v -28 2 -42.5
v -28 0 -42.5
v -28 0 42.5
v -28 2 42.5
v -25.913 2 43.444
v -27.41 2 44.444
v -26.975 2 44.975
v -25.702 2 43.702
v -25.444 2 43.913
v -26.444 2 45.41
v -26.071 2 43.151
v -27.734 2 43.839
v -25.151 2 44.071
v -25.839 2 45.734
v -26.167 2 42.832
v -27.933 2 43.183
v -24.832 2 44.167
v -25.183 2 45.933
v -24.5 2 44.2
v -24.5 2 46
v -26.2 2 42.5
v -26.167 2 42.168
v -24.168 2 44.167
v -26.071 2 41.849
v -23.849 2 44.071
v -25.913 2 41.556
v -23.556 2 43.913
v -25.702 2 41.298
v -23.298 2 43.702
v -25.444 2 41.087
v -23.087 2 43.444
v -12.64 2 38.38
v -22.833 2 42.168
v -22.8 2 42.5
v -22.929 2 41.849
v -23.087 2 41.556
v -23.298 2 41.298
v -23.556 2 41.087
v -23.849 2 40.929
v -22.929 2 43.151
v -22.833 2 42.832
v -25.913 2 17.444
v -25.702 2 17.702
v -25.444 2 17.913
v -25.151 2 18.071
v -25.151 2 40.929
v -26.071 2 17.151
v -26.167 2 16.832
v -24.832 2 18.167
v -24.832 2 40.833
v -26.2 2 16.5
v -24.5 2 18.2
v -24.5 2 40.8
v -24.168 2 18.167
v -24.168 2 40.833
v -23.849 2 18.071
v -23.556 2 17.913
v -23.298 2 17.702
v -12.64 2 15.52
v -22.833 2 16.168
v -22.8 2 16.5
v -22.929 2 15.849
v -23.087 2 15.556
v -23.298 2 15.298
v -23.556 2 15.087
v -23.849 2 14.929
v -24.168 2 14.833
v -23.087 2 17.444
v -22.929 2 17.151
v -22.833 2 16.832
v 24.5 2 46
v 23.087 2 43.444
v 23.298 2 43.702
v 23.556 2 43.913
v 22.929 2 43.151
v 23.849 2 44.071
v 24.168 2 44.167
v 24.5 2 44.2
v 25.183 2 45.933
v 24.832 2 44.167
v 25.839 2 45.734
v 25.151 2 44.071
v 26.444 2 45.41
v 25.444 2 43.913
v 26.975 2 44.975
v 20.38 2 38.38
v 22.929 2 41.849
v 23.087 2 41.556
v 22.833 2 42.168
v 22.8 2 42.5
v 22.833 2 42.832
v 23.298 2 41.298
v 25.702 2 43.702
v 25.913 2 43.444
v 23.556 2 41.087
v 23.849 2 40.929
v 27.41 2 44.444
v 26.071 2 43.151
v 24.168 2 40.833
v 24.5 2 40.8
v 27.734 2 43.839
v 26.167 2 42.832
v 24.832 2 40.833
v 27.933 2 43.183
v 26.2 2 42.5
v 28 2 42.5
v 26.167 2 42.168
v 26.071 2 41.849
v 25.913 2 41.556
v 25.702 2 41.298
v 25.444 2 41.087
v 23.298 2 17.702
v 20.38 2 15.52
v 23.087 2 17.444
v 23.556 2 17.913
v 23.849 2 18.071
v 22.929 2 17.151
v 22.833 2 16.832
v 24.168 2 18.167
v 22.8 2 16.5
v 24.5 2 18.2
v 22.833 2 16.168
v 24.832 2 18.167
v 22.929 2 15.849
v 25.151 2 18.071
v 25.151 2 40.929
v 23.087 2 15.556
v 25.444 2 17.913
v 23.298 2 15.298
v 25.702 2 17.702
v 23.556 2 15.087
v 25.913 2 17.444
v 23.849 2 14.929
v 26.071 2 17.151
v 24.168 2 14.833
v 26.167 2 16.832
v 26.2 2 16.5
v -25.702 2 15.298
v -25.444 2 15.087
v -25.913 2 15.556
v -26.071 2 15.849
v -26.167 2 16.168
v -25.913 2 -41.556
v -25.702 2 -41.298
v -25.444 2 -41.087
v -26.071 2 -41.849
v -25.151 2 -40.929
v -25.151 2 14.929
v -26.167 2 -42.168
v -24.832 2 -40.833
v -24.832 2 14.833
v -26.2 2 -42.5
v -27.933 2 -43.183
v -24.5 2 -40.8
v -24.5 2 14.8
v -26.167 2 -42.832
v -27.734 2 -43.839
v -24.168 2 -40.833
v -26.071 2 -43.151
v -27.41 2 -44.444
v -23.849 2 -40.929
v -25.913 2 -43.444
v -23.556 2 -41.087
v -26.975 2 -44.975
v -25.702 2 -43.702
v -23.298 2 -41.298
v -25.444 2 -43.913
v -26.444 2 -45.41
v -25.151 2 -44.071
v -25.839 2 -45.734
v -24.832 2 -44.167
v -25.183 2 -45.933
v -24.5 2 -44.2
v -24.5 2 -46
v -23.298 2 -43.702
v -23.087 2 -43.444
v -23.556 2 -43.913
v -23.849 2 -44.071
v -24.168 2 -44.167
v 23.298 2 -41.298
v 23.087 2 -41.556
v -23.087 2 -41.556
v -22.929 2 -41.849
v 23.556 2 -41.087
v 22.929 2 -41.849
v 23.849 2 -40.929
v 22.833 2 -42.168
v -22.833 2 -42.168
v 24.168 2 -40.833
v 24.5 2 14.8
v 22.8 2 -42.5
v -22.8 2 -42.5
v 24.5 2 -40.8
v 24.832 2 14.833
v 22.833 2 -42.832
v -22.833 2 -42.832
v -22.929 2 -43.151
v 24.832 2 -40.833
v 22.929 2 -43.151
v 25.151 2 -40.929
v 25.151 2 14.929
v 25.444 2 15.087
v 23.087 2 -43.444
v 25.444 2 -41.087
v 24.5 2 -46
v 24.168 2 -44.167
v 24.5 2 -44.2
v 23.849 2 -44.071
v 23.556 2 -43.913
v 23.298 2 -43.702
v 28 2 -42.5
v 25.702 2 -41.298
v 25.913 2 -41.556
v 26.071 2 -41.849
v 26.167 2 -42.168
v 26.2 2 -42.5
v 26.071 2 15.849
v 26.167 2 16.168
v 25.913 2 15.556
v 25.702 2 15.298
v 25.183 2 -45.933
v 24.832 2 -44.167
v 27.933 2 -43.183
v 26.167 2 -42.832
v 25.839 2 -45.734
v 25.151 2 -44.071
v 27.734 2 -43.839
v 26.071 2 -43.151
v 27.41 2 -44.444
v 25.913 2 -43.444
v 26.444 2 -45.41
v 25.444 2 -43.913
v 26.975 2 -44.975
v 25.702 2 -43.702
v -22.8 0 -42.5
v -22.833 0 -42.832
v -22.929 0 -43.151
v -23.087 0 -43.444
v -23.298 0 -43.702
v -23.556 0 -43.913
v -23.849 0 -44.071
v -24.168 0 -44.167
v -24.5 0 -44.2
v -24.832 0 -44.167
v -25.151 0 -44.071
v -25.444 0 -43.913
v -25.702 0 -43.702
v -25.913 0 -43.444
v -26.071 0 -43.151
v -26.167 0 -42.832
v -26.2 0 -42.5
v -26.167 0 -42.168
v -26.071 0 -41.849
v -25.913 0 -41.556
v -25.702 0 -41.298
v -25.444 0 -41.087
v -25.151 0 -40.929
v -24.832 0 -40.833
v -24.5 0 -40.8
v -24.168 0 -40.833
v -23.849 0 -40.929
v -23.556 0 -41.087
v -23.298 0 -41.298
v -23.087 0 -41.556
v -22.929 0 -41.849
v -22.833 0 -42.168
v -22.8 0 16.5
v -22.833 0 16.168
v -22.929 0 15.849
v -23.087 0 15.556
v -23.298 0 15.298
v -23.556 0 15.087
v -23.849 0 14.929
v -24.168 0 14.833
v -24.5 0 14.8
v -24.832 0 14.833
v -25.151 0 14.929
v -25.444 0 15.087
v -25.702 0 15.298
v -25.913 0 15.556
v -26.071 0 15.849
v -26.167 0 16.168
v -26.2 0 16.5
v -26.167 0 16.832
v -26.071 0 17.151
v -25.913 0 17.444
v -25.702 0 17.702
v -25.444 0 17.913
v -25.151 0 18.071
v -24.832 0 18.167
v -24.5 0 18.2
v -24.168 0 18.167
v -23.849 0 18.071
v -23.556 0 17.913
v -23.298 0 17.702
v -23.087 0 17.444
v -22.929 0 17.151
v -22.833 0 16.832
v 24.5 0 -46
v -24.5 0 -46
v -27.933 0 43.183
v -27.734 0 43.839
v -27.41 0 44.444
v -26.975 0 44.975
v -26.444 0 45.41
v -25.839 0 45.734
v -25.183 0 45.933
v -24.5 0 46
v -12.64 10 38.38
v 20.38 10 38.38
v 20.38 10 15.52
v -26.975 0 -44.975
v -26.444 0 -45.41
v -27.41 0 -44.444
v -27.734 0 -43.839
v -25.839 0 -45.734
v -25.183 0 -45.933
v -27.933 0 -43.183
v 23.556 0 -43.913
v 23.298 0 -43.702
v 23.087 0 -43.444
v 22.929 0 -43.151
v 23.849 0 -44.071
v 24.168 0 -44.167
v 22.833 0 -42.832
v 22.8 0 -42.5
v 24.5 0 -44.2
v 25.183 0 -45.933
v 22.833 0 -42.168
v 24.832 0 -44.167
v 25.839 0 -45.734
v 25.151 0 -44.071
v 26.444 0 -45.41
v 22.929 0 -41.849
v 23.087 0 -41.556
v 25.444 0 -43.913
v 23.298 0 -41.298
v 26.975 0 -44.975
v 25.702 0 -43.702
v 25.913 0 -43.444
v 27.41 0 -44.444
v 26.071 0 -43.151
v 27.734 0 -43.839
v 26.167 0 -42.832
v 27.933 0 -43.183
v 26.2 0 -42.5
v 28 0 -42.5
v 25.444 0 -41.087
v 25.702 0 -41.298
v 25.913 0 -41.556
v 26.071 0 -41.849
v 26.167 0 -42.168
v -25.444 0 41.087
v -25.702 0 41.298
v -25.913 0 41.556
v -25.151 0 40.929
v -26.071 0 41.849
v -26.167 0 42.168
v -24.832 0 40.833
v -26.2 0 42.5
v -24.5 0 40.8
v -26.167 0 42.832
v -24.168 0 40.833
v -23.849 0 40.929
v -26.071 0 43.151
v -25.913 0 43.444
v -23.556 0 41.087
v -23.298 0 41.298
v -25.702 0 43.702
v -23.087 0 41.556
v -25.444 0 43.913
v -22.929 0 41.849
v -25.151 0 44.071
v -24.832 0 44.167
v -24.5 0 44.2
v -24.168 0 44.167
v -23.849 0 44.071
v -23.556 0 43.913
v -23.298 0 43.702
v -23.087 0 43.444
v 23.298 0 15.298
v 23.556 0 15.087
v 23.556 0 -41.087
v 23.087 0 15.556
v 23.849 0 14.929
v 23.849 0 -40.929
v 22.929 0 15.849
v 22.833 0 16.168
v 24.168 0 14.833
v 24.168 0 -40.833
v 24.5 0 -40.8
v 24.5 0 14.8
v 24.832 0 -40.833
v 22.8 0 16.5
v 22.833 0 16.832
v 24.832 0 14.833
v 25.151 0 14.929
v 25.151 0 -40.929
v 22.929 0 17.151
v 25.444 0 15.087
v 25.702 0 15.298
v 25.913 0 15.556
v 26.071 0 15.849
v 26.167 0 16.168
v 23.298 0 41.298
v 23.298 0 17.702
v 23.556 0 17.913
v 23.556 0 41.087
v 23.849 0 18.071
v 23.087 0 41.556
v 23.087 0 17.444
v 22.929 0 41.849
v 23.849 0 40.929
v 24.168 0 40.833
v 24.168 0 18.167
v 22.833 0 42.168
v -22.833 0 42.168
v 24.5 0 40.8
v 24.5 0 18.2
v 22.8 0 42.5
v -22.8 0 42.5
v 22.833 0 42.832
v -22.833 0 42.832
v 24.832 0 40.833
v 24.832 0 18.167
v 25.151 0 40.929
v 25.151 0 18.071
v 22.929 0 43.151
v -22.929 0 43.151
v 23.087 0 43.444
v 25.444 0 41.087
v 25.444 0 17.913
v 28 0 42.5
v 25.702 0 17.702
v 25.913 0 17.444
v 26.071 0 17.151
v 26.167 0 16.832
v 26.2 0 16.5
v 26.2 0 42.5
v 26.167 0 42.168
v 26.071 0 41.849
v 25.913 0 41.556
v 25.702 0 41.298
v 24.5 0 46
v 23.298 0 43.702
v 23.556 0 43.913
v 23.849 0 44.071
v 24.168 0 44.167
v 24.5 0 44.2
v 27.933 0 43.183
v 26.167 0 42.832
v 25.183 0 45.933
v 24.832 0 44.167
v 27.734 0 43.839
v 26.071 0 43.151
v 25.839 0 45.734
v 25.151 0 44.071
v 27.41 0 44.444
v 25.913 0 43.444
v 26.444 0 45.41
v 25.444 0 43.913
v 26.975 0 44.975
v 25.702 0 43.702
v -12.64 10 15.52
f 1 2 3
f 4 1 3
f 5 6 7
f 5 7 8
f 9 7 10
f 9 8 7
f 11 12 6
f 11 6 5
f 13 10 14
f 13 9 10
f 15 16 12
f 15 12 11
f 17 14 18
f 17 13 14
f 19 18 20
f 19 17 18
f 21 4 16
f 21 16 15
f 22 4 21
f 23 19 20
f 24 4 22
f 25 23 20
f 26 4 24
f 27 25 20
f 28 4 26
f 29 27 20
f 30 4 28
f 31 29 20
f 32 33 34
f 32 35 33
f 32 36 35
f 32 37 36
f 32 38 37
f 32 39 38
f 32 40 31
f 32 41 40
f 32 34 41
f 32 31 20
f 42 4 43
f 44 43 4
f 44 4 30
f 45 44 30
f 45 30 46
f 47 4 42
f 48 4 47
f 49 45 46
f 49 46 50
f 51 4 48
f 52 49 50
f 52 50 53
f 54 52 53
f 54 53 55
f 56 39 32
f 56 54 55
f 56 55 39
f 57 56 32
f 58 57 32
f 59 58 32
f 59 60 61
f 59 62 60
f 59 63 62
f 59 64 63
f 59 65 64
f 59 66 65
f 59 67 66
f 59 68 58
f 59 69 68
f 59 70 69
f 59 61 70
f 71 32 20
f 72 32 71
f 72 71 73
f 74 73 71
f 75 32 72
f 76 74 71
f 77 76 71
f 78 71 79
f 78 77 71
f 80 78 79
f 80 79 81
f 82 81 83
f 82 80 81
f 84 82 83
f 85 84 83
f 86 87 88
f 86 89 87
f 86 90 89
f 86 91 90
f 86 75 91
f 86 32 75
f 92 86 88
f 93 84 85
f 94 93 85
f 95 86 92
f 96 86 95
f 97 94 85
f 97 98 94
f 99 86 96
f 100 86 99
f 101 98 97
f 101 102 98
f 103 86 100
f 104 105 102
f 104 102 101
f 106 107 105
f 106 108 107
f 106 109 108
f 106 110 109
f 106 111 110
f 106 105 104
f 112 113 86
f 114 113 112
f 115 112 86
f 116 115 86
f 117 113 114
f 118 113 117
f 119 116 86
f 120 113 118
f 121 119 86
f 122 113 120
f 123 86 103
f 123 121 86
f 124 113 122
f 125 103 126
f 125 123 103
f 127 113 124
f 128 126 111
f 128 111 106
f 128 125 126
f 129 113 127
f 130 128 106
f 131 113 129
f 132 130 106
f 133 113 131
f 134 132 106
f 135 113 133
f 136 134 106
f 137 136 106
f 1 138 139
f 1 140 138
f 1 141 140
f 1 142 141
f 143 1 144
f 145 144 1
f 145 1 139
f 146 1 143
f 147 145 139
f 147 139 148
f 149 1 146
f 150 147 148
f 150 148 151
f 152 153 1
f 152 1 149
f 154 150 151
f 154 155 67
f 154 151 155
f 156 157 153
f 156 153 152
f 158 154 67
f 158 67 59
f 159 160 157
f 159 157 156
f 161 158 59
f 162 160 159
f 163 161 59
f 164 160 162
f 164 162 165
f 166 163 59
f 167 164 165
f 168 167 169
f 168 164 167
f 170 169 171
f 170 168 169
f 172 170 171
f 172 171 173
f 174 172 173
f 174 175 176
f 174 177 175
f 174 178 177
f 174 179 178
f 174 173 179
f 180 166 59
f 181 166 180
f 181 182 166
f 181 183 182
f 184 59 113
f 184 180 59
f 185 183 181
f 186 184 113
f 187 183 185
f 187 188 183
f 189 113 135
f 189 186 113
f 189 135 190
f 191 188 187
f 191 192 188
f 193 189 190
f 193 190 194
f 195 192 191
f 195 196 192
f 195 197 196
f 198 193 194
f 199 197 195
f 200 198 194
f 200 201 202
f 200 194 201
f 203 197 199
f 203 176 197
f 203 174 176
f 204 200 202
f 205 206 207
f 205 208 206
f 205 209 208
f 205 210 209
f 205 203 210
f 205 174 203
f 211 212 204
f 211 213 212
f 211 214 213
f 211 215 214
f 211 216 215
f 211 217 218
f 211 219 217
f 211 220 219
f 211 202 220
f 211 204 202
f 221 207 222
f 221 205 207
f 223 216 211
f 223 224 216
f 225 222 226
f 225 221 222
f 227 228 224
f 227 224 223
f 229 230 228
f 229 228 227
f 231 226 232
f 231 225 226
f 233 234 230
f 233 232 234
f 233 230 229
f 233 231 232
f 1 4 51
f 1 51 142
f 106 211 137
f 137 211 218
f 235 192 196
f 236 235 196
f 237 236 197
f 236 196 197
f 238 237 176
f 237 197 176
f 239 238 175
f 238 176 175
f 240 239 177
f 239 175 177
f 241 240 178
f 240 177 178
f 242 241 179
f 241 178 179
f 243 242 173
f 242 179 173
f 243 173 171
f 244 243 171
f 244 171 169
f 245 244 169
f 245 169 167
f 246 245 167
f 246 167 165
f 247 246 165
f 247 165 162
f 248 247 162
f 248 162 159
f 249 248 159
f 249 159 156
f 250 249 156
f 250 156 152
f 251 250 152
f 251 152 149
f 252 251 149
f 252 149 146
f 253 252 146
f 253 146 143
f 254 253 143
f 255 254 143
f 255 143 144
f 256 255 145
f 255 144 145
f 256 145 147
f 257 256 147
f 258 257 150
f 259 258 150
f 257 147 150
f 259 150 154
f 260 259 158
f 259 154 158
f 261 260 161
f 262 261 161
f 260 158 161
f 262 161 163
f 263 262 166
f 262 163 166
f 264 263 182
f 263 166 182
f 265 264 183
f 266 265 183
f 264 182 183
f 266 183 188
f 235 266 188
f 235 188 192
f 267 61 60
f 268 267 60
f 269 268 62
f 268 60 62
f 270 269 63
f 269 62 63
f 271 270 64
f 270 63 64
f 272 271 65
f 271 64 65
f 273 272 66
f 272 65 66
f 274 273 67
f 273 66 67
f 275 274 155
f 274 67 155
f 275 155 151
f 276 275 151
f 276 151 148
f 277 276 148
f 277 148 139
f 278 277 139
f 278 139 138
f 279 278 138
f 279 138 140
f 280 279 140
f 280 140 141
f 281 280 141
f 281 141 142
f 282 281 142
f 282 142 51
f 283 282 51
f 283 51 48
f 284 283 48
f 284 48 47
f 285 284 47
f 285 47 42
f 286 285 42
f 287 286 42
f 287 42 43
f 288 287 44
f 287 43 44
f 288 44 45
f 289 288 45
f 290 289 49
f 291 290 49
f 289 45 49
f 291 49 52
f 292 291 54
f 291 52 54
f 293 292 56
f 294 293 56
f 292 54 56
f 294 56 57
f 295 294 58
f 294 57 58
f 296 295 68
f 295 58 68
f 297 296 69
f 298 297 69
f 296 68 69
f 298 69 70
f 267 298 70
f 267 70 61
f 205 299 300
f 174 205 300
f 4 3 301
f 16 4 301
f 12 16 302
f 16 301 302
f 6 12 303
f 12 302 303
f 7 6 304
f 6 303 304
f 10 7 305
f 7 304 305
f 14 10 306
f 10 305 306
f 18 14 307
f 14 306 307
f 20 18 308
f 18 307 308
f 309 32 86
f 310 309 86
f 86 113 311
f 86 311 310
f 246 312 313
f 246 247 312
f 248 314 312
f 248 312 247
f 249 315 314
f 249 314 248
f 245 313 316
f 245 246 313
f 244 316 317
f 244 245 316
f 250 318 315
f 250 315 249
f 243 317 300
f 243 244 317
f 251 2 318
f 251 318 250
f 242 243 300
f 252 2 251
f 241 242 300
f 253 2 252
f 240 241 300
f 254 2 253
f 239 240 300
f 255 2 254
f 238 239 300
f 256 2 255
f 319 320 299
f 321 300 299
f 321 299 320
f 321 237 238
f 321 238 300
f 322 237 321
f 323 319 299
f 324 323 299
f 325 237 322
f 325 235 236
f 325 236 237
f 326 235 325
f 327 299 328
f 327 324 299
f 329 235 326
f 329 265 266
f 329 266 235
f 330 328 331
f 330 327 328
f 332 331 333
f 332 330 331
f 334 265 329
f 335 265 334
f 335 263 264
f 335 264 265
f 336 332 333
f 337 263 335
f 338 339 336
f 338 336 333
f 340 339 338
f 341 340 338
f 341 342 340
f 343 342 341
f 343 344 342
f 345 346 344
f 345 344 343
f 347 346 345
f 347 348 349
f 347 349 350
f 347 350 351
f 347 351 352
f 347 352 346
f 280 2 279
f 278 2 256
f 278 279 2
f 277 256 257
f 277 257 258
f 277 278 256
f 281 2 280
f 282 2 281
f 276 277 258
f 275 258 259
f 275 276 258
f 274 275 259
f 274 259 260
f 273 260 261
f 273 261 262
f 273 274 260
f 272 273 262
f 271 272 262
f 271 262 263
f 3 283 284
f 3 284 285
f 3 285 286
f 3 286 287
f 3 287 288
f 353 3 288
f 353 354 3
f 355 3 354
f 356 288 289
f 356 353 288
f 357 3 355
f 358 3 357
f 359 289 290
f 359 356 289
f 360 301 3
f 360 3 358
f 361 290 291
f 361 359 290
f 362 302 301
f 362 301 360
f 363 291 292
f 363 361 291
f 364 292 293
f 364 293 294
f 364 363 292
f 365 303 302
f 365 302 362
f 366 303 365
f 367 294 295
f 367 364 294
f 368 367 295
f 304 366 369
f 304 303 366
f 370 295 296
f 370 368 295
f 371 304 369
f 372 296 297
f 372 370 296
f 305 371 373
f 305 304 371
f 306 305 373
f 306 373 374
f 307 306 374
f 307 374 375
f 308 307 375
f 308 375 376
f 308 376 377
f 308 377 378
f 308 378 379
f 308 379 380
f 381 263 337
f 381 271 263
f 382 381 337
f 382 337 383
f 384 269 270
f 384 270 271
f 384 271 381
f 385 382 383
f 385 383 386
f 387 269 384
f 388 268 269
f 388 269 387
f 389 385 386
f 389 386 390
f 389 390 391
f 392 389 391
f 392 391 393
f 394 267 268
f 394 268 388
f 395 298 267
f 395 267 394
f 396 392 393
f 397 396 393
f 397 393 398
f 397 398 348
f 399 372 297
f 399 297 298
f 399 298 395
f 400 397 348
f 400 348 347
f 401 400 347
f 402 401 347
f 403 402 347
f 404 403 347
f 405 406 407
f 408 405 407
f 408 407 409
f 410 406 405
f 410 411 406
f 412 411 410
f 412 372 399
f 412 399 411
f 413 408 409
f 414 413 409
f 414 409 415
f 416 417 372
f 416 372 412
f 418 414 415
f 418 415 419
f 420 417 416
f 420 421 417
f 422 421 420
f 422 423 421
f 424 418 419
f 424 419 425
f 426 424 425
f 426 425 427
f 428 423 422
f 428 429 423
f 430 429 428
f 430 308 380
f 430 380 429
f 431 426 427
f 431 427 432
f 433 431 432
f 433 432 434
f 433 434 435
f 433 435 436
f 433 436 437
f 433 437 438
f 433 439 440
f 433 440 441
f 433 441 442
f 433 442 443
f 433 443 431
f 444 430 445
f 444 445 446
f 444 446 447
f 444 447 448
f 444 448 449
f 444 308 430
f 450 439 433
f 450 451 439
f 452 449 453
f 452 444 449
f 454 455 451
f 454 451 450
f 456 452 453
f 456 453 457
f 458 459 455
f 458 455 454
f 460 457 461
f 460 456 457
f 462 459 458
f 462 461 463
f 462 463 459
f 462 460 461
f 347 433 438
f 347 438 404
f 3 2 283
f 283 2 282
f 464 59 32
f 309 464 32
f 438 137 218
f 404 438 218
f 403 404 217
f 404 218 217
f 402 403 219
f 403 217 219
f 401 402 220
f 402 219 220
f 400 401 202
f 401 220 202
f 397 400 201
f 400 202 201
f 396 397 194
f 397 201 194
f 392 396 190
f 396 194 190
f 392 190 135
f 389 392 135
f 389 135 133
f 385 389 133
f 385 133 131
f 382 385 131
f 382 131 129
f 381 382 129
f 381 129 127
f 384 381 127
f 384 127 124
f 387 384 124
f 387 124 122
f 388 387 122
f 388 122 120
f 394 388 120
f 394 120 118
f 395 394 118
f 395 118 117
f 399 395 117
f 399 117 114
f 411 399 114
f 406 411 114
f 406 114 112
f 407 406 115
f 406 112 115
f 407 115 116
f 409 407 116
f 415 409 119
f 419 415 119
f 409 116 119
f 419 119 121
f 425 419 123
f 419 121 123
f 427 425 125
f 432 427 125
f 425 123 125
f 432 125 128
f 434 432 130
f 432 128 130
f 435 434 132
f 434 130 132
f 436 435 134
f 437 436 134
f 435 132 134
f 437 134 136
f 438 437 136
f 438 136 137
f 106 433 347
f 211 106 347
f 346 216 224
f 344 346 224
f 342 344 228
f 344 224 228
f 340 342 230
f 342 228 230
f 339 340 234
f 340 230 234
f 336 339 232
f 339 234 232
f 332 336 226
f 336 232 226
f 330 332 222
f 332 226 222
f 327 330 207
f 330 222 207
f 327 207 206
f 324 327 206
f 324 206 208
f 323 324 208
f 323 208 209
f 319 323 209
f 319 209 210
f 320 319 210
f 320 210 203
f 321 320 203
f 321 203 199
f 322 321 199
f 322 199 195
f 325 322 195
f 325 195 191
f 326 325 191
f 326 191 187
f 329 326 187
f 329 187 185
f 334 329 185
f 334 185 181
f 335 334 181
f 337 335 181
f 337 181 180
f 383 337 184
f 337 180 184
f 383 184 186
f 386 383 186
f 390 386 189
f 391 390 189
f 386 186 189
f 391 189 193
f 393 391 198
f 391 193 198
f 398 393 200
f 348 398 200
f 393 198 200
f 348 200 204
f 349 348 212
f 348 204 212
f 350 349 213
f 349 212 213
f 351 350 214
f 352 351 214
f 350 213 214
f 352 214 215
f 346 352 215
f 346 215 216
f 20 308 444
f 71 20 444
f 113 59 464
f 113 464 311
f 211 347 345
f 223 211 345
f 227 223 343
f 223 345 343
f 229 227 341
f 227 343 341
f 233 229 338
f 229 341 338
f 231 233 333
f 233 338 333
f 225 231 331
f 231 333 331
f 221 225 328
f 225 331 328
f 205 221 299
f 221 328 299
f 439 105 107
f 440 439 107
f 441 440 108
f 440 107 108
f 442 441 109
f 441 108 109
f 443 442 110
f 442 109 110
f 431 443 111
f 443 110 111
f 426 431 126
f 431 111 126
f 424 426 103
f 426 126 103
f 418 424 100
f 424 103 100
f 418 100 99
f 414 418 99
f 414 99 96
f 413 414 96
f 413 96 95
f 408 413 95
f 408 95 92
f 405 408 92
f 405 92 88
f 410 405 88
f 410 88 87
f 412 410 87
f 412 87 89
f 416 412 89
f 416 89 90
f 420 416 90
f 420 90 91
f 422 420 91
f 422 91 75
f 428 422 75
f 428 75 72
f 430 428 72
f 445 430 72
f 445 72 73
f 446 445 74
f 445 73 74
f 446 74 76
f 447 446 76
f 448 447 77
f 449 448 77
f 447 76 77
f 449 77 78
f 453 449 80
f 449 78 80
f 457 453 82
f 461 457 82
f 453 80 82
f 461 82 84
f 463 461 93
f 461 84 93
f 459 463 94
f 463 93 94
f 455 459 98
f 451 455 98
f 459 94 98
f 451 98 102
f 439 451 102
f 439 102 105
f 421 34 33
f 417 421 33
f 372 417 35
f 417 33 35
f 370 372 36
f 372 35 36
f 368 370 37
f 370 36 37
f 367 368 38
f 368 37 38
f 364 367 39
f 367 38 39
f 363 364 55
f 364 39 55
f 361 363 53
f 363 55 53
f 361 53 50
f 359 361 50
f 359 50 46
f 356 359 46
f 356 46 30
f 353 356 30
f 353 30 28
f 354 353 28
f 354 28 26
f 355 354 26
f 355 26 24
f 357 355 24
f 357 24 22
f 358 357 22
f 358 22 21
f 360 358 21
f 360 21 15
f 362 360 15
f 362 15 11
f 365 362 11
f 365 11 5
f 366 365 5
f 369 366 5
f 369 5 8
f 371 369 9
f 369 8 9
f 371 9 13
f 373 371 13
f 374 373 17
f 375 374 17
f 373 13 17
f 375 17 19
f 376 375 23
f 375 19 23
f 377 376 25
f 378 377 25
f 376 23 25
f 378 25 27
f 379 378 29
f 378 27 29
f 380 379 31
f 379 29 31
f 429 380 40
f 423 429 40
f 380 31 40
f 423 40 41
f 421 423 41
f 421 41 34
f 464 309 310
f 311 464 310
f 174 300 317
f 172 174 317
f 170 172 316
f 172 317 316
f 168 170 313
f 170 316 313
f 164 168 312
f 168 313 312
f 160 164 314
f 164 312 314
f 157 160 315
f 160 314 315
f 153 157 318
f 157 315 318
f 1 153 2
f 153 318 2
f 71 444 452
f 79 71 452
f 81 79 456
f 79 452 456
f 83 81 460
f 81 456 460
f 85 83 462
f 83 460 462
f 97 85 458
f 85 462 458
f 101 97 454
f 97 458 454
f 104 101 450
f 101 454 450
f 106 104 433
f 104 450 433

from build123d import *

# Parameters (mm, degrees)
BOSS_EXTRUDE1_DEPTH  = 2
SKETCH2_W            = 33.02
SKETCH2_H            = 22.86
BOSS_EXTRUDE2_DEPTH  = 10
M3_CLEARANCE_HOLE1_D = 3.4


with BuildPart() as part:
    # Sketch1 → Boss-Extrude1 (new body)
    with BuildSketch(Plane(origin=(0, 0, 0), x_dir=(1, 0, 0), z_dir=(0, 1, 0))):
        with BuildLine():
            Line((24.5, 46), (-24.5, 46))
            ThreePointArc((-24.5, 46), (-26.974873734, 44.974873734), (-28, 42.5))
            Line((-28, 42.5), (-28, -42.5))
            ThreePointArc((-28, -42.5), (-26.974873734, -44.974873734), (-24.5, -46))
            Line((-24.5, -46), (24.5, -46))
            ThreePointArc((24.5, -46), (26.974873734, -44.974873734), (28, -42.5))
            Line((28, -42.5), (28, 42.5))
            ThreePointArc((28, 42.5), (26.974873734, 44.974873734), (24.5, 46))
        make_face()
    extrude(amount=BOSS_EXTRUDE1_DEPTH)

    # Sketch2 → Boss-Extrude2 (add)
    with BuildSketch(Plane.XZ):
        with Locations((3.87, 26.95)):
            Rectangle(SKETCH2_W, SKETCH2_H)
    extrude(amount=-BOSS_EXTRUDE2_DEPTH)

    # M3 Clearance Hole1 (through all)
    with Locations(Plane(origin=(0, 0, 0), x_dir=(-1, 0, 0), z_dir=(0, -1, 0))):
        with Locations((-24.5, -42.5), (24.5, -42.5), (24.5, -16.5), (-24.5, -16.5), (-24.5, 42.5), (24.5, 42.5)):
            Hole(M3_CLEARANCE_HOLE1_D / 2)


solid = part.part
